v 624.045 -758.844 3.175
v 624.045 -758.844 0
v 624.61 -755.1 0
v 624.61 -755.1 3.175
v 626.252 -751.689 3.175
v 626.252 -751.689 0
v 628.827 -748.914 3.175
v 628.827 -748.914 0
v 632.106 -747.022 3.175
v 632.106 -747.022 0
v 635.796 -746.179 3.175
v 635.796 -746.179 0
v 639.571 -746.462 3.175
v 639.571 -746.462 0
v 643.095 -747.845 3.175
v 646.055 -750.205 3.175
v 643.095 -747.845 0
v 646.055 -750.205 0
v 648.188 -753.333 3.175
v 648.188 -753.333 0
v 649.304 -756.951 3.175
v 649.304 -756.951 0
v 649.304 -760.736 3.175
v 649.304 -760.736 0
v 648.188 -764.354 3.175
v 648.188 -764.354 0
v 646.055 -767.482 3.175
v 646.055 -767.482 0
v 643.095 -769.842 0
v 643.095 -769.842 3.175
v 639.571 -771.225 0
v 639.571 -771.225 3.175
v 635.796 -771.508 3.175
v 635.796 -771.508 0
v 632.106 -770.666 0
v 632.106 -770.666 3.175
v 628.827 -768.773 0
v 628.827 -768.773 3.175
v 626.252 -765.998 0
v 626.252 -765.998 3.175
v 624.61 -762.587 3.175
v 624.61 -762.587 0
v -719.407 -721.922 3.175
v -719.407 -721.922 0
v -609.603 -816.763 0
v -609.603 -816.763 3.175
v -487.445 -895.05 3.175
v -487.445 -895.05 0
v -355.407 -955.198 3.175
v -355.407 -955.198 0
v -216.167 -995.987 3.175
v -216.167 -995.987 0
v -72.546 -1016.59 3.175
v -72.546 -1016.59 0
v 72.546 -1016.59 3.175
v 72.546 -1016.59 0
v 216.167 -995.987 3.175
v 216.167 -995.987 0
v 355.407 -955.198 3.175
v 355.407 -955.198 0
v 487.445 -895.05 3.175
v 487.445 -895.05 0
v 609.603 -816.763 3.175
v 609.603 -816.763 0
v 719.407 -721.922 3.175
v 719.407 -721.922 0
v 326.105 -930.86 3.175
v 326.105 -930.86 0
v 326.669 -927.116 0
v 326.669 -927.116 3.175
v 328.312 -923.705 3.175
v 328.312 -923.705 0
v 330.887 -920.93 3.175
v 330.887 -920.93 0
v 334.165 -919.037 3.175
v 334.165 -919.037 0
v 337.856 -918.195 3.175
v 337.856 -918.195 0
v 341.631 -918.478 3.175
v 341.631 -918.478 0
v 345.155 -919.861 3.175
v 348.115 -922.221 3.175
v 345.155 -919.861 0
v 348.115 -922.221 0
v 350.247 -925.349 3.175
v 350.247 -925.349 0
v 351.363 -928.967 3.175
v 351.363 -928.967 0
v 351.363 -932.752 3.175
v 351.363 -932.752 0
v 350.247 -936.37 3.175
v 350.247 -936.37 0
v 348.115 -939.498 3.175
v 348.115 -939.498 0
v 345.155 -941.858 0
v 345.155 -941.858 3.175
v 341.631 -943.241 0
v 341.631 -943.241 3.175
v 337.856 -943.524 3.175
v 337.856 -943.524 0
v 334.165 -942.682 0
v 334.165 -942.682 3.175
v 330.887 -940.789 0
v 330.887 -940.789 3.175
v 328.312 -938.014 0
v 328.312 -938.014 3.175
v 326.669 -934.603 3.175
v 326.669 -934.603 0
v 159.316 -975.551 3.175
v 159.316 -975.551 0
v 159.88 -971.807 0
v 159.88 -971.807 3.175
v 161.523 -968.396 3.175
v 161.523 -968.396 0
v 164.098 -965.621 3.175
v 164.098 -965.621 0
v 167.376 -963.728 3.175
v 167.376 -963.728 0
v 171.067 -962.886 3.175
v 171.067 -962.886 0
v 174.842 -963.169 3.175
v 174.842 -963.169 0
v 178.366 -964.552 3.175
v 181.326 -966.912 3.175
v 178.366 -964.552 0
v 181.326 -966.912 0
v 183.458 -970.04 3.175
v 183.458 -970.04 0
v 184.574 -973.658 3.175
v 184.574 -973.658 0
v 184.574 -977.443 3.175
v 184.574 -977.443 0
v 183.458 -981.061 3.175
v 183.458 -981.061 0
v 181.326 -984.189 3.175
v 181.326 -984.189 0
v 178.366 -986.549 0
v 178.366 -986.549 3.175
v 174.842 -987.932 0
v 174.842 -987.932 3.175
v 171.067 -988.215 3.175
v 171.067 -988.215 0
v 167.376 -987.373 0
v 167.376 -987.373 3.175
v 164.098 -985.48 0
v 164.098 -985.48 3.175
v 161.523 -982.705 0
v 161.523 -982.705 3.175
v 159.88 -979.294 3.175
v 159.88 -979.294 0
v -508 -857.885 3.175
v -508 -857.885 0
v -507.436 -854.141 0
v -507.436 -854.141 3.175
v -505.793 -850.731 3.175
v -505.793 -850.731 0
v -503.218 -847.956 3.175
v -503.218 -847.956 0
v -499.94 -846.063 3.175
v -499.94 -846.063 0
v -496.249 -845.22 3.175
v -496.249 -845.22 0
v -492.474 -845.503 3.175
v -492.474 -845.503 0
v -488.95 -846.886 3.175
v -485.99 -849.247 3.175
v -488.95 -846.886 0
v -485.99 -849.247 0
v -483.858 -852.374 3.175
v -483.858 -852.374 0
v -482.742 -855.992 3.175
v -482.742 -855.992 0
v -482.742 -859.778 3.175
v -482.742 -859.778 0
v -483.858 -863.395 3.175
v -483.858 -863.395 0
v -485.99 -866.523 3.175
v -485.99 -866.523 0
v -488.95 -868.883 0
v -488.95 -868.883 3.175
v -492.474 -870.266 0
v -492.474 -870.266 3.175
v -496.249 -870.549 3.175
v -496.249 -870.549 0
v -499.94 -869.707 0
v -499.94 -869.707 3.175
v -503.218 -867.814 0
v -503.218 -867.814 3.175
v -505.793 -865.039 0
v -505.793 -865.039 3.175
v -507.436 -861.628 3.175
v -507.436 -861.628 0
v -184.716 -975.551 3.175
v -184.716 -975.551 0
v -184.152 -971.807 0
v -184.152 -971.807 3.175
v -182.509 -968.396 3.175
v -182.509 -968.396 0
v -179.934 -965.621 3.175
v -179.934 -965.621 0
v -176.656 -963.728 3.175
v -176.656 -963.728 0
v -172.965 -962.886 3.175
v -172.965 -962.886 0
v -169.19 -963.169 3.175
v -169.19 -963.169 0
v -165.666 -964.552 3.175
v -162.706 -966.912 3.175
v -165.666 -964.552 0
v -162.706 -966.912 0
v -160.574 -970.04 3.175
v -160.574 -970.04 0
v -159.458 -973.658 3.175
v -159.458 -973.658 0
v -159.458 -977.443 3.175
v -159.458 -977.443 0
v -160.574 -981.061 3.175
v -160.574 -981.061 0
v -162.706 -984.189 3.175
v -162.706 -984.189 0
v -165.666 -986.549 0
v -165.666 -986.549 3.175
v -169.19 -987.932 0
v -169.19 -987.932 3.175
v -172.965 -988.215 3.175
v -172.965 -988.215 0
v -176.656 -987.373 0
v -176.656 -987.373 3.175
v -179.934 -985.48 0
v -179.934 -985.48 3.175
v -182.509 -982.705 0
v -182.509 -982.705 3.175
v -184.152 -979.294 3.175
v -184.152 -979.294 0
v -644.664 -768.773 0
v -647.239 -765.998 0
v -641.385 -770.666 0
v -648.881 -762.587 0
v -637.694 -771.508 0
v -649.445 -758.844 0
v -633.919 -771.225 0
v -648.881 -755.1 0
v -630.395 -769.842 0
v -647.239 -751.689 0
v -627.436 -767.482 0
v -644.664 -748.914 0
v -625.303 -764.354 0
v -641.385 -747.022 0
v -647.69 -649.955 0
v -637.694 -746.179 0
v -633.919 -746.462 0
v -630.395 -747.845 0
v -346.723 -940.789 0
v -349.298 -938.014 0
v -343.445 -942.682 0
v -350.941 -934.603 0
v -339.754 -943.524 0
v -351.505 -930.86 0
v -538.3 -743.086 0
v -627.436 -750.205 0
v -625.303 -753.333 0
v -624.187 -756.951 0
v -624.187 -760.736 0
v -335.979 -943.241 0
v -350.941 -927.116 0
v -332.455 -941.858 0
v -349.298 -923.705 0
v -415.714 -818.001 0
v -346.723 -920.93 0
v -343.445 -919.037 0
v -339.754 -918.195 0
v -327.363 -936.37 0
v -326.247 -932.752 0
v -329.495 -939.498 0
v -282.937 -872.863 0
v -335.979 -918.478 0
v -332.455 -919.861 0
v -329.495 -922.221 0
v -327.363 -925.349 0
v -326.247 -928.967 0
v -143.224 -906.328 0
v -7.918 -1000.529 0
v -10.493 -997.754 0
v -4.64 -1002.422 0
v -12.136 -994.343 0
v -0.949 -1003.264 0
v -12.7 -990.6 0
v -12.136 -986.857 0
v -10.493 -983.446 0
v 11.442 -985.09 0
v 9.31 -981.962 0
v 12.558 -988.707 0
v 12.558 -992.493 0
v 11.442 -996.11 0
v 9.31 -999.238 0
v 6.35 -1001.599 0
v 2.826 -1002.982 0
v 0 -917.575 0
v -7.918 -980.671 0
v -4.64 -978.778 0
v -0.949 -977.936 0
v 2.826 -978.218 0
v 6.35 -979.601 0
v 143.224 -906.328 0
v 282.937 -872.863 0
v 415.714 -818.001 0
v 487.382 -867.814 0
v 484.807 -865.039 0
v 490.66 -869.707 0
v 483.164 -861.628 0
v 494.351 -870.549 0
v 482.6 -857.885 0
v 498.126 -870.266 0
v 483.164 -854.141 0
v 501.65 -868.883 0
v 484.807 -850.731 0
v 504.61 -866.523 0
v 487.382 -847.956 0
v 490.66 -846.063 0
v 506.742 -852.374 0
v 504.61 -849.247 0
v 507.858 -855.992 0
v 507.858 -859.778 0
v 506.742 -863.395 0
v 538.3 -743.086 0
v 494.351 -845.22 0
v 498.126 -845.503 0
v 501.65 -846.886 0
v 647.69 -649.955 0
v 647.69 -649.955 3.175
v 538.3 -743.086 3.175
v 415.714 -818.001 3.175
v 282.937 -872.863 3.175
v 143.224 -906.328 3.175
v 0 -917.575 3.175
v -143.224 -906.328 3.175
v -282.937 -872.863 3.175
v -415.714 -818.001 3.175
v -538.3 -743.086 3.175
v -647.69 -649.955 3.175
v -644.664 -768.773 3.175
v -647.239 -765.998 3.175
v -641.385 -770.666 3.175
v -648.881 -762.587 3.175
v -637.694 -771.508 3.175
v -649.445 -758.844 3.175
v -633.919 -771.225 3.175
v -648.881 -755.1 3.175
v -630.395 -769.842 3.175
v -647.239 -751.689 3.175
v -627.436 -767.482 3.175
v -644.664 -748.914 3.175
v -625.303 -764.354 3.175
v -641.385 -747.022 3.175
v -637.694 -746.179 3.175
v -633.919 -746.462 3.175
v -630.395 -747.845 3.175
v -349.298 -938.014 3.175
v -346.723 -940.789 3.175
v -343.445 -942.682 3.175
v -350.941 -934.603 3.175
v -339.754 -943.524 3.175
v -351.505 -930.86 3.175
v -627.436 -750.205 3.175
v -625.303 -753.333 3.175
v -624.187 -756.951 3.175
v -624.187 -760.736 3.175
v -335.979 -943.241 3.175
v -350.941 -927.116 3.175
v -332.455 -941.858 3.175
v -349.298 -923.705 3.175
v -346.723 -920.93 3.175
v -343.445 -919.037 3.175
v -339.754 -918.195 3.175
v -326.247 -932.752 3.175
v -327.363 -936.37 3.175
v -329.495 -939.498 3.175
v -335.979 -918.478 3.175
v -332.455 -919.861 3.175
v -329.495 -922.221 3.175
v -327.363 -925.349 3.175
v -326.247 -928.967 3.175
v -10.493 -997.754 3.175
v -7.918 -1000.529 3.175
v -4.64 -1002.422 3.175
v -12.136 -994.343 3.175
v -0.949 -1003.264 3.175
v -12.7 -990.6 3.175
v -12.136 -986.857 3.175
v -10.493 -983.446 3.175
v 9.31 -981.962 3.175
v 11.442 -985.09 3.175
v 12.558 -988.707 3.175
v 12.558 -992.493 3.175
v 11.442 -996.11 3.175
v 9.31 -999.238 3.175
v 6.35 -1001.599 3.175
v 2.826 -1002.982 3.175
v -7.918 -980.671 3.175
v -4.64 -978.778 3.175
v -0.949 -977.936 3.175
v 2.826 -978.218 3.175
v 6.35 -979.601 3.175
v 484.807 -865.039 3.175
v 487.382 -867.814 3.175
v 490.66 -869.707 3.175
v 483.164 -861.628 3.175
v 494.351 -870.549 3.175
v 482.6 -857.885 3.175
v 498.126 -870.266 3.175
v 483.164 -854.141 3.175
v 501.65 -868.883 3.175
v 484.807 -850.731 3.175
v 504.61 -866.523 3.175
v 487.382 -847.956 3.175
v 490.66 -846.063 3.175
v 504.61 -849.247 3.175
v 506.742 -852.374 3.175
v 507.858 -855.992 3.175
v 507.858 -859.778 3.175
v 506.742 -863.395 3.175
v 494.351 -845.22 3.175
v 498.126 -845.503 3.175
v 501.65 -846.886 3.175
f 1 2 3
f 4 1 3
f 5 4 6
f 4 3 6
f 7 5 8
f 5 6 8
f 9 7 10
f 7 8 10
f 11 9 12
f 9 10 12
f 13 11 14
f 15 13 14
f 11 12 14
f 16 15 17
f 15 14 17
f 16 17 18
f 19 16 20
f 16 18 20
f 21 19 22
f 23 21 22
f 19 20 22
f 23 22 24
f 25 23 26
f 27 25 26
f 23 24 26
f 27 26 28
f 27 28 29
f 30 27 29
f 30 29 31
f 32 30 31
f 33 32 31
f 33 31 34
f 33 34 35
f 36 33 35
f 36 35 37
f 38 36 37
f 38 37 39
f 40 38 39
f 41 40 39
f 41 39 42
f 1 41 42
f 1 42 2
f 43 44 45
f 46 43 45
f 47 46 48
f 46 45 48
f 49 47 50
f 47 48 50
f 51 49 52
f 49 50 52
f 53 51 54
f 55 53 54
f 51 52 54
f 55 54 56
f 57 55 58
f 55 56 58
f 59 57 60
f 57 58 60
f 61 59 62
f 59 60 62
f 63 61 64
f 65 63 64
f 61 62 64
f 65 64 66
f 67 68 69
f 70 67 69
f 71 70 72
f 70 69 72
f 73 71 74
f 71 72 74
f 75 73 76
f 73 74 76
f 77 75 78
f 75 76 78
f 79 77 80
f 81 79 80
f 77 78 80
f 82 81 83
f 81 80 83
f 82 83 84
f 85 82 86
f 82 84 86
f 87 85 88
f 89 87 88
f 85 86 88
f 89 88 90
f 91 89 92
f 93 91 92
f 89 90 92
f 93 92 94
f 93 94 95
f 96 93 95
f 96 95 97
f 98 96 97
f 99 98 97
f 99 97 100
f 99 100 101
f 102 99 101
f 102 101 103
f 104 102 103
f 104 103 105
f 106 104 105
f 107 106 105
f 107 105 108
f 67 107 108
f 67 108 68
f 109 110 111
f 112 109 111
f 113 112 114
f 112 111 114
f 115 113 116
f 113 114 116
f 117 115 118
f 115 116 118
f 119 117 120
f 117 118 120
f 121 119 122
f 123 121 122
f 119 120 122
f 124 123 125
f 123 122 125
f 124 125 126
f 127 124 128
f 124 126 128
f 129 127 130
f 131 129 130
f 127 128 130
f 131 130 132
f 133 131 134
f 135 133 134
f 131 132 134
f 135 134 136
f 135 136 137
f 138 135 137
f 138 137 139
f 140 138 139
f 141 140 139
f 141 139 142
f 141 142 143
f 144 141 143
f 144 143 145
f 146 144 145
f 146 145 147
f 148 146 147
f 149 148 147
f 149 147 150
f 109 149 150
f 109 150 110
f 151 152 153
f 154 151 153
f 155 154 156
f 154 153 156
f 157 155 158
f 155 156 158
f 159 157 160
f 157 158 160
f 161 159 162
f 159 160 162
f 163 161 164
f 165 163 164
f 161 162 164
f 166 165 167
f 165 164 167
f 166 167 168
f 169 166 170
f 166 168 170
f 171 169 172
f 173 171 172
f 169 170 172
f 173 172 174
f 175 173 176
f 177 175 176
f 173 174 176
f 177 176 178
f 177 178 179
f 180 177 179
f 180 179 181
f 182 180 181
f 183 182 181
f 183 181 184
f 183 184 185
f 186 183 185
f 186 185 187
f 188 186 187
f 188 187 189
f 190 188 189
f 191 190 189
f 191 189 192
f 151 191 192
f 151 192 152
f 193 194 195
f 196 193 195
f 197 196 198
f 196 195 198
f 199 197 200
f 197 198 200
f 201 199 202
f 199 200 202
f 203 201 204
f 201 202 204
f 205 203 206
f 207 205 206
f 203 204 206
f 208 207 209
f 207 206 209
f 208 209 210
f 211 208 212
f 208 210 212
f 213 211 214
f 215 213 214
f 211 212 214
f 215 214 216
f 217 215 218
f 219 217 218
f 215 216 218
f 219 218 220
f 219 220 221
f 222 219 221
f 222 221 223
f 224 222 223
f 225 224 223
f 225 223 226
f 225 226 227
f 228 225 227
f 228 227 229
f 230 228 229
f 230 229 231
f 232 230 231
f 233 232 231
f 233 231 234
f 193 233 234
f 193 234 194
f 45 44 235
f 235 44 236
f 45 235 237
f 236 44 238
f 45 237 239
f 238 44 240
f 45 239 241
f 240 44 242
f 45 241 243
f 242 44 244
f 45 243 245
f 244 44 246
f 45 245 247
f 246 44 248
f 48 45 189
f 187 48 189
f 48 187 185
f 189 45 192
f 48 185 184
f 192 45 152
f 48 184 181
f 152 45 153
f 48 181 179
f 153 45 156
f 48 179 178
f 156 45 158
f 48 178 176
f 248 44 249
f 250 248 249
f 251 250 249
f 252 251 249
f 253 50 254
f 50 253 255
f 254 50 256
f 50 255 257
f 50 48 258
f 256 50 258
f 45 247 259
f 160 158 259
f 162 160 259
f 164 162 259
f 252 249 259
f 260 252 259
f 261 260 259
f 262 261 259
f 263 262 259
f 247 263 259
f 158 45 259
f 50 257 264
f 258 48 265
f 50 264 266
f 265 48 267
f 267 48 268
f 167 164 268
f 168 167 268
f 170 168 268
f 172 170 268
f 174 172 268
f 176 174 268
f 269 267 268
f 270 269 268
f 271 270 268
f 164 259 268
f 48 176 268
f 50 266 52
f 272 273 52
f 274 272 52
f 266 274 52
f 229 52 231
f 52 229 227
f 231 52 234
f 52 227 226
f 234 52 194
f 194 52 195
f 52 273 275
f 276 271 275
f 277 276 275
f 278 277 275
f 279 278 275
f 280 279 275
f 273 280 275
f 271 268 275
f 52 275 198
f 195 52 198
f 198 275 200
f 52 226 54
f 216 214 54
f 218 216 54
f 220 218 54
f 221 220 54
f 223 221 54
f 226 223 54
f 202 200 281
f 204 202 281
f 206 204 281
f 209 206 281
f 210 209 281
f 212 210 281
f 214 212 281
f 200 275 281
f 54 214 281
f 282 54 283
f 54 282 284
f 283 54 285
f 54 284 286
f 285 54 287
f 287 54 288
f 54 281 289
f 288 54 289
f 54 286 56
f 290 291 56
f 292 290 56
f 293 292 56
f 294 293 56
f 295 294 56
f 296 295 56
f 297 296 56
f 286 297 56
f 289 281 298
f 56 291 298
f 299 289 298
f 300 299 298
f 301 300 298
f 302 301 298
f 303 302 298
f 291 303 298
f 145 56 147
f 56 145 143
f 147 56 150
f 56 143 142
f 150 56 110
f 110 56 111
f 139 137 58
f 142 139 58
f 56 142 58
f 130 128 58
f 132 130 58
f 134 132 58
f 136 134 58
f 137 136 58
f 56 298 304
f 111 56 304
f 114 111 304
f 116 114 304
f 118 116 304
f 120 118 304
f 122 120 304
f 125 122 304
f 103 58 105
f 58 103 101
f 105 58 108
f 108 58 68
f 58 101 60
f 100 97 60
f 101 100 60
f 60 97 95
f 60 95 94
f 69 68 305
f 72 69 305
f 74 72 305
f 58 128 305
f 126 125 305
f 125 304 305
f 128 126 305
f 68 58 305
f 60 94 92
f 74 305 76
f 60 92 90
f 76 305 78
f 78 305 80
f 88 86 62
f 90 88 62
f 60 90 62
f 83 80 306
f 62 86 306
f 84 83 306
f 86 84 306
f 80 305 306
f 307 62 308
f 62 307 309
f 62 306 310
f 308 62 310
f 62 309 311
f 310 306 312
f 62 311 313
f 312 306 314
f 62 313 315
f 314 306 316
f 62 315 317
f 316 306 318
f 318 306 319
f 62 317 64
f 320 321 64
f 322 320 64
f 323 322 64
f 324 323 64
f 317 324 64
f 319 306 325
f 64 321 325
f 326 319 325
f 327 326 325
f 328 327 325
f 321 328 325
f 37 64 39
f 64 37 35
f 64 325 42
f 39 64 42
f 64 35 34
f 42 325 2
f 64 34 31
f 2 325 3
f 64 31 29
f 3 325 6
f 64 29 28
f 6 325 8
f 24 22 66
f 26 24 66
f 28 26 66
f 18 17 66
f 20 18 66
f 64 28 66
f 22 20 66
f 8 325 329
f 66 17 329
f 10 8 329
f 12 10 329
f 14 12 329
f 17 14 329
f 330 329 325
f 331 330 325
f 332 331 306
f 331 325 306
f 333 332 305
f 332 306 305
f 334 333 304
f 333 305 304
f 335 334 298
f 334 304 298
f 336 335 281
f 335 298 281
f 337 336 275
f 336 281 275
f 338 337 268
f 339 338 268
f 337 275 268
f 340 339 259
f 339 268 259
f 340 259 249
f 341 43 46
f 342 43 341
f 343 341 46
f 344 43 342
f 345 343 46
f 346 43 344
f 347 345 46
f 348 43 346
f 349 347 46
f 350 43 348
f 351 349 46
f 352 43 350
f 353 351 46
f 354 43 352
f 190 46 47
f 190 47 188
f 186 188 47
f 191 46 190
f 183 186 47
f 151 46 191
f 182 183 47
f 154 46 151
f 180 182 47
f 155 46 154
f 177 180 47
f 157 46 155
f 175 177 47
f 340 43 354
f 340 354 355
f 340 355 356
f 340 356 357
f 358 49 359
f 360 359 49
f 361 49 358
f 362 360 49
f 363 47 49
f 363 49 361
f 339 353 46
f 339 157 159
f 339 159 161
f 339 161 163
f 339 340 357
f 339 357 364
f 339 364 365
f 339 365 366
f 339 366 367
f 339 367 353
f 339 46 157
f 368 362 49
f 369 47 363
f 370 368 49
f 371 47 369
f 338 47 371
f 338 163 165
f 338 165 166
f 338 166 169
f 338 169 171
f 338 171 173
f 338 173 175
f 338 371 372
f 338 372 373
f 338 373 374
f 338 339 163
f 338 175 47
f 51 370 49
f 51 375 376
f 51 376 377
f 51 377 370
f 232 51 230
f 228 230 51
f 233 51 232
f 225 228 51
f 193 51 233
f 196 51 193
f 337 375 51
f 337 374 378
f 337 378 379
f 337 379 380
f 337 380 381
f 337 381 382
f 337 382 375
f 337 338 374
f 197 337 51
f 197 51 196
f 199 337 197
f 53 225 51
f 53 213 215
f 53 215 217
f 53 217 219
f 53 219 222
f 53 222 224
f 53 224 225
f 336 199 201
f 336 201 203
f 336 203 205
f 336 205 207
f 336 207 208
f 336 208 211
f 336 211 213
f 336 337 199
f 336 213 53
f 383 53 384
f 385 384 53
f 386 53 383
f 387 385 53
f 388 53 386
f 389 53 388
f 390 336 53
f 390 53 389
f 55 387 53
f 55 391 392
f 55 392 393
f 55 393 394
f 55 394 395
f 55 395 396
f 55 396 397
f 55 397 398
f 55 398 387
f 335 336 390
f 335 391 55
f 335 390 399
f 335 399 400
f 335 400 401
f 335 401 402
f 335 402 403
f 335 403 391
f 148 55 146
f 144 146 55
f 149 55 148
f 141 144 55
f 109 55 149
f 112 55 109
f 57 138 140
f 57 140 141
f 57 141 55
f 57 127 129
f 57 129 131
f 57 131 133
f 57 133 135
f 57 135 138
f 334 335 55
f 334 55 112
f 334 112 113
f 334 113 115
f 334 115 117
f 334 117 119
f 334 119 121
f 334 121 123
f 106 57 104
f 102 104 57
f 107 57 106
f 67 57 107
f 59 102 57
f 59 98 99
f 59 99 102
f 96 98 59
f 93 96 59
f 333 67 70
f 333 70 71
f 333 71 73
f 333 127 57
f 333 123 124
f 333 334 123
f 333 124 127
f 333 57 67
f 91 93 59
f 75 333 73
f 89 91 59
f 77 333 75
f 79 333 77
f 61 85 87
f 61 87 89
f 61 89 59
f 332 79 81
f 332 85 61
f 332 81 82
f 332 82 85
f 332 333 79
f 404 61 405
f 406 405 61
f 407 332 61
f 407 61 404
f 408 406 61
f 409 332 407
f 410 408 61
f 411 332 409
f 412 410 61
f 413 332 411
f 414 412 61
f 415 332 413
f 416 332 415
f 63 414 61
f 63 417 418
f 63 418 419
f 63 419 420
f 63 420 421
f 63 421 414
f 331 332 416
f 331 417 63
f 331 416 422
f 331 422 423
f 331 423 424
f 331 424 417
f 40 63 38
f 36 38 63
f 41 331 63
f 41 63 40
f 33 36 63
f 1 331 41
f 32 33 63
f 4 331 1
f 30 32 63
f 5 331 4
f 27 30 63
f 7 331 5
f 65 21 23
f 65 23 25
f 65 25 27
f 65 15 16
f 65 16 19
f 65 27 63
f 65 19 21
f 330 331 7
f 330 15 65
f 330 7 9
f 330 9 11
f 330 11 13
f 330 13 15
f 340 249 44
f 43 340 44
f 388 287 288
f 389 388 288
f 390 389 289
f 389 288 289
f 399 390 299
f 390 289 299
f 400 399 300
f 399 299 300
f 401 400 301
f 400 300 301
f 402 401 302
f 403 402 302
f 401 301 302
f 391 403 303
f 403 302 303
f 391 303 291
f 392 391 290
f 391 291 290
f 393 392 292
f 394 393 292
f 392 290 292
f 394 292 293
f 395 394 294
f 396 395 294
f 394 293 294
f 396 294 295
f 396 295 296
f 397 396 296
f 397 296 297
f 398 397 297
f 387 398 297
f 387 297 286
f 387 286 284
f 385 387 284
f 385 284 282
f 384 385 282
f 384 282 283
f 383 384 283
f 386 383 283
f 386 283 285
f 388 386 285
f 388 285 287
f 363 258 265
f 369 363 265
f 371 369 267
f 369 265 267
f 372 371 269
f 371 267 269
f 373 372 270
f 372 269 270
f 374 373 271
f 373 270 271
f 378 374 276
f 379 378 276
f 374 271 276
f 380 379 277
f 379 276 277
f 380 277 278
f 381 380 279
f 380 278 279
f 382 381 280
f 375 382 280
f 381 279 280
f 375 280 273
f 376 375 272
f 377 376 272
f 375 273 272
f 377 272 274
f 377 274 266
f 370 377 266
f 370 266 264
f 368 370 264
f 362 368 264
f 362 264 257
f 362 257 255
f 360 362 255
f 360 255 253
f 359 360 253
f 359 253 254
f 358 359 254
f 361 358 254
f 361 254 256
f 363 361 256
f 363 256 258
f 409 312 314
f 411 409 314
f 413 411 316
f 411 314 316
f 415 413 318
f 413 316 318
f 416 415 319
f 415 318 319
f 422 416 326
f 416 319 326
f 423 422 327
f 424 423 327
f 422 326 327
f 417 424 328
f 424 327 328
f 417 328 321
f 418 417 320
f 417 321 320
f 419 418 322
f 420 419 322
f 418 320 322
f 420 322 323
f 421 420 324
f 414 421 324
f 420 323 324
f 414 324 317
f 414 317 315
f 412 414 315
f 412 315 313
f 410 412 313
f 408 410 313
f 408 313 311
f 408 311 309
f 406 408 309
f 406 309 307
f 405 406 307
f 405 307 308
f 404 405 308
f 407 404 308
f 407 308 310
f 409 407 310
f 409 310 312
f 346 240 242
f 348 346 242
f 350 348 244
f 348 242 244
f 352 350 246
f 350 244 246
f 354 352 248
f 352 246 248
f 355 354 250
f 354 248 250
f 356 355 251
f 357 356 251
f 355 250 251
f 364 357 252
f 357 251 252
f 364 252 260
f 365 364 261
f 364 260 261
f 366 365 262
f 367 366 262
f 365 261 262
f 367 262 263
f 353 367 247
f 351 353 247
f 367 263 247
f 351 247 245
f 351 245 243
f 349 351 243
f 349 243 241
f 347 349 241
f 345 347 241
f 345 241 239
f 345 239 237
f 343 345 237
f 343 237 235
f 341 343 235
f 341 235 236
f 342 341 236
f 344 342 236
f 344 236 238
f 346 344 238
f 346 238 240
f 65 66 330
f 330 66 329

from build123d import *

# Parameters (mm, degrees)
BOSS_EXTRUDE1_DEPTH    = 3.175
F_1_1_DIAMETER_HOLE1_D = 25.4


with BuildPart() as part:
    # Sketch → Boss-Extrude1 (new body)
    with BuildSketch(Plane.XY):
        with BuildLine():
            Line((-647.690106465, -649.9549266), (-719.406658046, -721.922254113))
            ThreePointArc((-719.406658046, -721.922254113), (0, -1019.175), (719.406658046, -721.922254113))
            Line((719.406658046, -721.922254113), (647.690106465, -649.9549266))
            ThreePointArc((647.690106465, -649.9549266), (0, -917.575), (-647.690106465, -649.9549266))
        make_face()
    extrude(amount=BOSS_EXTRUDE1_DEPTH)

    # 1 (1) Diameter Hole1 (through all)
    with Locations(Plane(origin=(-384.964871278, 41.304236103, 3.175), x_dir=(1, 0, 0), z_dir=(0, 0, 1))):
        with Locations((1021.710277433, -800.147861457), (880.264871278, -899.189001092), (723.770025256, -972.163746254), (556.980756074, -1016.854796237), (384.964871278, -1031.904236103), (212.948986481, -1016.854796237), (46.159717299, -972.163746254), (-110.335128722, -899.189001092), (-251.780534878, -800.147861457)):
            Hole(F_1_1_DIAMETER_HOLE1_D / 2)


solid = part.part
